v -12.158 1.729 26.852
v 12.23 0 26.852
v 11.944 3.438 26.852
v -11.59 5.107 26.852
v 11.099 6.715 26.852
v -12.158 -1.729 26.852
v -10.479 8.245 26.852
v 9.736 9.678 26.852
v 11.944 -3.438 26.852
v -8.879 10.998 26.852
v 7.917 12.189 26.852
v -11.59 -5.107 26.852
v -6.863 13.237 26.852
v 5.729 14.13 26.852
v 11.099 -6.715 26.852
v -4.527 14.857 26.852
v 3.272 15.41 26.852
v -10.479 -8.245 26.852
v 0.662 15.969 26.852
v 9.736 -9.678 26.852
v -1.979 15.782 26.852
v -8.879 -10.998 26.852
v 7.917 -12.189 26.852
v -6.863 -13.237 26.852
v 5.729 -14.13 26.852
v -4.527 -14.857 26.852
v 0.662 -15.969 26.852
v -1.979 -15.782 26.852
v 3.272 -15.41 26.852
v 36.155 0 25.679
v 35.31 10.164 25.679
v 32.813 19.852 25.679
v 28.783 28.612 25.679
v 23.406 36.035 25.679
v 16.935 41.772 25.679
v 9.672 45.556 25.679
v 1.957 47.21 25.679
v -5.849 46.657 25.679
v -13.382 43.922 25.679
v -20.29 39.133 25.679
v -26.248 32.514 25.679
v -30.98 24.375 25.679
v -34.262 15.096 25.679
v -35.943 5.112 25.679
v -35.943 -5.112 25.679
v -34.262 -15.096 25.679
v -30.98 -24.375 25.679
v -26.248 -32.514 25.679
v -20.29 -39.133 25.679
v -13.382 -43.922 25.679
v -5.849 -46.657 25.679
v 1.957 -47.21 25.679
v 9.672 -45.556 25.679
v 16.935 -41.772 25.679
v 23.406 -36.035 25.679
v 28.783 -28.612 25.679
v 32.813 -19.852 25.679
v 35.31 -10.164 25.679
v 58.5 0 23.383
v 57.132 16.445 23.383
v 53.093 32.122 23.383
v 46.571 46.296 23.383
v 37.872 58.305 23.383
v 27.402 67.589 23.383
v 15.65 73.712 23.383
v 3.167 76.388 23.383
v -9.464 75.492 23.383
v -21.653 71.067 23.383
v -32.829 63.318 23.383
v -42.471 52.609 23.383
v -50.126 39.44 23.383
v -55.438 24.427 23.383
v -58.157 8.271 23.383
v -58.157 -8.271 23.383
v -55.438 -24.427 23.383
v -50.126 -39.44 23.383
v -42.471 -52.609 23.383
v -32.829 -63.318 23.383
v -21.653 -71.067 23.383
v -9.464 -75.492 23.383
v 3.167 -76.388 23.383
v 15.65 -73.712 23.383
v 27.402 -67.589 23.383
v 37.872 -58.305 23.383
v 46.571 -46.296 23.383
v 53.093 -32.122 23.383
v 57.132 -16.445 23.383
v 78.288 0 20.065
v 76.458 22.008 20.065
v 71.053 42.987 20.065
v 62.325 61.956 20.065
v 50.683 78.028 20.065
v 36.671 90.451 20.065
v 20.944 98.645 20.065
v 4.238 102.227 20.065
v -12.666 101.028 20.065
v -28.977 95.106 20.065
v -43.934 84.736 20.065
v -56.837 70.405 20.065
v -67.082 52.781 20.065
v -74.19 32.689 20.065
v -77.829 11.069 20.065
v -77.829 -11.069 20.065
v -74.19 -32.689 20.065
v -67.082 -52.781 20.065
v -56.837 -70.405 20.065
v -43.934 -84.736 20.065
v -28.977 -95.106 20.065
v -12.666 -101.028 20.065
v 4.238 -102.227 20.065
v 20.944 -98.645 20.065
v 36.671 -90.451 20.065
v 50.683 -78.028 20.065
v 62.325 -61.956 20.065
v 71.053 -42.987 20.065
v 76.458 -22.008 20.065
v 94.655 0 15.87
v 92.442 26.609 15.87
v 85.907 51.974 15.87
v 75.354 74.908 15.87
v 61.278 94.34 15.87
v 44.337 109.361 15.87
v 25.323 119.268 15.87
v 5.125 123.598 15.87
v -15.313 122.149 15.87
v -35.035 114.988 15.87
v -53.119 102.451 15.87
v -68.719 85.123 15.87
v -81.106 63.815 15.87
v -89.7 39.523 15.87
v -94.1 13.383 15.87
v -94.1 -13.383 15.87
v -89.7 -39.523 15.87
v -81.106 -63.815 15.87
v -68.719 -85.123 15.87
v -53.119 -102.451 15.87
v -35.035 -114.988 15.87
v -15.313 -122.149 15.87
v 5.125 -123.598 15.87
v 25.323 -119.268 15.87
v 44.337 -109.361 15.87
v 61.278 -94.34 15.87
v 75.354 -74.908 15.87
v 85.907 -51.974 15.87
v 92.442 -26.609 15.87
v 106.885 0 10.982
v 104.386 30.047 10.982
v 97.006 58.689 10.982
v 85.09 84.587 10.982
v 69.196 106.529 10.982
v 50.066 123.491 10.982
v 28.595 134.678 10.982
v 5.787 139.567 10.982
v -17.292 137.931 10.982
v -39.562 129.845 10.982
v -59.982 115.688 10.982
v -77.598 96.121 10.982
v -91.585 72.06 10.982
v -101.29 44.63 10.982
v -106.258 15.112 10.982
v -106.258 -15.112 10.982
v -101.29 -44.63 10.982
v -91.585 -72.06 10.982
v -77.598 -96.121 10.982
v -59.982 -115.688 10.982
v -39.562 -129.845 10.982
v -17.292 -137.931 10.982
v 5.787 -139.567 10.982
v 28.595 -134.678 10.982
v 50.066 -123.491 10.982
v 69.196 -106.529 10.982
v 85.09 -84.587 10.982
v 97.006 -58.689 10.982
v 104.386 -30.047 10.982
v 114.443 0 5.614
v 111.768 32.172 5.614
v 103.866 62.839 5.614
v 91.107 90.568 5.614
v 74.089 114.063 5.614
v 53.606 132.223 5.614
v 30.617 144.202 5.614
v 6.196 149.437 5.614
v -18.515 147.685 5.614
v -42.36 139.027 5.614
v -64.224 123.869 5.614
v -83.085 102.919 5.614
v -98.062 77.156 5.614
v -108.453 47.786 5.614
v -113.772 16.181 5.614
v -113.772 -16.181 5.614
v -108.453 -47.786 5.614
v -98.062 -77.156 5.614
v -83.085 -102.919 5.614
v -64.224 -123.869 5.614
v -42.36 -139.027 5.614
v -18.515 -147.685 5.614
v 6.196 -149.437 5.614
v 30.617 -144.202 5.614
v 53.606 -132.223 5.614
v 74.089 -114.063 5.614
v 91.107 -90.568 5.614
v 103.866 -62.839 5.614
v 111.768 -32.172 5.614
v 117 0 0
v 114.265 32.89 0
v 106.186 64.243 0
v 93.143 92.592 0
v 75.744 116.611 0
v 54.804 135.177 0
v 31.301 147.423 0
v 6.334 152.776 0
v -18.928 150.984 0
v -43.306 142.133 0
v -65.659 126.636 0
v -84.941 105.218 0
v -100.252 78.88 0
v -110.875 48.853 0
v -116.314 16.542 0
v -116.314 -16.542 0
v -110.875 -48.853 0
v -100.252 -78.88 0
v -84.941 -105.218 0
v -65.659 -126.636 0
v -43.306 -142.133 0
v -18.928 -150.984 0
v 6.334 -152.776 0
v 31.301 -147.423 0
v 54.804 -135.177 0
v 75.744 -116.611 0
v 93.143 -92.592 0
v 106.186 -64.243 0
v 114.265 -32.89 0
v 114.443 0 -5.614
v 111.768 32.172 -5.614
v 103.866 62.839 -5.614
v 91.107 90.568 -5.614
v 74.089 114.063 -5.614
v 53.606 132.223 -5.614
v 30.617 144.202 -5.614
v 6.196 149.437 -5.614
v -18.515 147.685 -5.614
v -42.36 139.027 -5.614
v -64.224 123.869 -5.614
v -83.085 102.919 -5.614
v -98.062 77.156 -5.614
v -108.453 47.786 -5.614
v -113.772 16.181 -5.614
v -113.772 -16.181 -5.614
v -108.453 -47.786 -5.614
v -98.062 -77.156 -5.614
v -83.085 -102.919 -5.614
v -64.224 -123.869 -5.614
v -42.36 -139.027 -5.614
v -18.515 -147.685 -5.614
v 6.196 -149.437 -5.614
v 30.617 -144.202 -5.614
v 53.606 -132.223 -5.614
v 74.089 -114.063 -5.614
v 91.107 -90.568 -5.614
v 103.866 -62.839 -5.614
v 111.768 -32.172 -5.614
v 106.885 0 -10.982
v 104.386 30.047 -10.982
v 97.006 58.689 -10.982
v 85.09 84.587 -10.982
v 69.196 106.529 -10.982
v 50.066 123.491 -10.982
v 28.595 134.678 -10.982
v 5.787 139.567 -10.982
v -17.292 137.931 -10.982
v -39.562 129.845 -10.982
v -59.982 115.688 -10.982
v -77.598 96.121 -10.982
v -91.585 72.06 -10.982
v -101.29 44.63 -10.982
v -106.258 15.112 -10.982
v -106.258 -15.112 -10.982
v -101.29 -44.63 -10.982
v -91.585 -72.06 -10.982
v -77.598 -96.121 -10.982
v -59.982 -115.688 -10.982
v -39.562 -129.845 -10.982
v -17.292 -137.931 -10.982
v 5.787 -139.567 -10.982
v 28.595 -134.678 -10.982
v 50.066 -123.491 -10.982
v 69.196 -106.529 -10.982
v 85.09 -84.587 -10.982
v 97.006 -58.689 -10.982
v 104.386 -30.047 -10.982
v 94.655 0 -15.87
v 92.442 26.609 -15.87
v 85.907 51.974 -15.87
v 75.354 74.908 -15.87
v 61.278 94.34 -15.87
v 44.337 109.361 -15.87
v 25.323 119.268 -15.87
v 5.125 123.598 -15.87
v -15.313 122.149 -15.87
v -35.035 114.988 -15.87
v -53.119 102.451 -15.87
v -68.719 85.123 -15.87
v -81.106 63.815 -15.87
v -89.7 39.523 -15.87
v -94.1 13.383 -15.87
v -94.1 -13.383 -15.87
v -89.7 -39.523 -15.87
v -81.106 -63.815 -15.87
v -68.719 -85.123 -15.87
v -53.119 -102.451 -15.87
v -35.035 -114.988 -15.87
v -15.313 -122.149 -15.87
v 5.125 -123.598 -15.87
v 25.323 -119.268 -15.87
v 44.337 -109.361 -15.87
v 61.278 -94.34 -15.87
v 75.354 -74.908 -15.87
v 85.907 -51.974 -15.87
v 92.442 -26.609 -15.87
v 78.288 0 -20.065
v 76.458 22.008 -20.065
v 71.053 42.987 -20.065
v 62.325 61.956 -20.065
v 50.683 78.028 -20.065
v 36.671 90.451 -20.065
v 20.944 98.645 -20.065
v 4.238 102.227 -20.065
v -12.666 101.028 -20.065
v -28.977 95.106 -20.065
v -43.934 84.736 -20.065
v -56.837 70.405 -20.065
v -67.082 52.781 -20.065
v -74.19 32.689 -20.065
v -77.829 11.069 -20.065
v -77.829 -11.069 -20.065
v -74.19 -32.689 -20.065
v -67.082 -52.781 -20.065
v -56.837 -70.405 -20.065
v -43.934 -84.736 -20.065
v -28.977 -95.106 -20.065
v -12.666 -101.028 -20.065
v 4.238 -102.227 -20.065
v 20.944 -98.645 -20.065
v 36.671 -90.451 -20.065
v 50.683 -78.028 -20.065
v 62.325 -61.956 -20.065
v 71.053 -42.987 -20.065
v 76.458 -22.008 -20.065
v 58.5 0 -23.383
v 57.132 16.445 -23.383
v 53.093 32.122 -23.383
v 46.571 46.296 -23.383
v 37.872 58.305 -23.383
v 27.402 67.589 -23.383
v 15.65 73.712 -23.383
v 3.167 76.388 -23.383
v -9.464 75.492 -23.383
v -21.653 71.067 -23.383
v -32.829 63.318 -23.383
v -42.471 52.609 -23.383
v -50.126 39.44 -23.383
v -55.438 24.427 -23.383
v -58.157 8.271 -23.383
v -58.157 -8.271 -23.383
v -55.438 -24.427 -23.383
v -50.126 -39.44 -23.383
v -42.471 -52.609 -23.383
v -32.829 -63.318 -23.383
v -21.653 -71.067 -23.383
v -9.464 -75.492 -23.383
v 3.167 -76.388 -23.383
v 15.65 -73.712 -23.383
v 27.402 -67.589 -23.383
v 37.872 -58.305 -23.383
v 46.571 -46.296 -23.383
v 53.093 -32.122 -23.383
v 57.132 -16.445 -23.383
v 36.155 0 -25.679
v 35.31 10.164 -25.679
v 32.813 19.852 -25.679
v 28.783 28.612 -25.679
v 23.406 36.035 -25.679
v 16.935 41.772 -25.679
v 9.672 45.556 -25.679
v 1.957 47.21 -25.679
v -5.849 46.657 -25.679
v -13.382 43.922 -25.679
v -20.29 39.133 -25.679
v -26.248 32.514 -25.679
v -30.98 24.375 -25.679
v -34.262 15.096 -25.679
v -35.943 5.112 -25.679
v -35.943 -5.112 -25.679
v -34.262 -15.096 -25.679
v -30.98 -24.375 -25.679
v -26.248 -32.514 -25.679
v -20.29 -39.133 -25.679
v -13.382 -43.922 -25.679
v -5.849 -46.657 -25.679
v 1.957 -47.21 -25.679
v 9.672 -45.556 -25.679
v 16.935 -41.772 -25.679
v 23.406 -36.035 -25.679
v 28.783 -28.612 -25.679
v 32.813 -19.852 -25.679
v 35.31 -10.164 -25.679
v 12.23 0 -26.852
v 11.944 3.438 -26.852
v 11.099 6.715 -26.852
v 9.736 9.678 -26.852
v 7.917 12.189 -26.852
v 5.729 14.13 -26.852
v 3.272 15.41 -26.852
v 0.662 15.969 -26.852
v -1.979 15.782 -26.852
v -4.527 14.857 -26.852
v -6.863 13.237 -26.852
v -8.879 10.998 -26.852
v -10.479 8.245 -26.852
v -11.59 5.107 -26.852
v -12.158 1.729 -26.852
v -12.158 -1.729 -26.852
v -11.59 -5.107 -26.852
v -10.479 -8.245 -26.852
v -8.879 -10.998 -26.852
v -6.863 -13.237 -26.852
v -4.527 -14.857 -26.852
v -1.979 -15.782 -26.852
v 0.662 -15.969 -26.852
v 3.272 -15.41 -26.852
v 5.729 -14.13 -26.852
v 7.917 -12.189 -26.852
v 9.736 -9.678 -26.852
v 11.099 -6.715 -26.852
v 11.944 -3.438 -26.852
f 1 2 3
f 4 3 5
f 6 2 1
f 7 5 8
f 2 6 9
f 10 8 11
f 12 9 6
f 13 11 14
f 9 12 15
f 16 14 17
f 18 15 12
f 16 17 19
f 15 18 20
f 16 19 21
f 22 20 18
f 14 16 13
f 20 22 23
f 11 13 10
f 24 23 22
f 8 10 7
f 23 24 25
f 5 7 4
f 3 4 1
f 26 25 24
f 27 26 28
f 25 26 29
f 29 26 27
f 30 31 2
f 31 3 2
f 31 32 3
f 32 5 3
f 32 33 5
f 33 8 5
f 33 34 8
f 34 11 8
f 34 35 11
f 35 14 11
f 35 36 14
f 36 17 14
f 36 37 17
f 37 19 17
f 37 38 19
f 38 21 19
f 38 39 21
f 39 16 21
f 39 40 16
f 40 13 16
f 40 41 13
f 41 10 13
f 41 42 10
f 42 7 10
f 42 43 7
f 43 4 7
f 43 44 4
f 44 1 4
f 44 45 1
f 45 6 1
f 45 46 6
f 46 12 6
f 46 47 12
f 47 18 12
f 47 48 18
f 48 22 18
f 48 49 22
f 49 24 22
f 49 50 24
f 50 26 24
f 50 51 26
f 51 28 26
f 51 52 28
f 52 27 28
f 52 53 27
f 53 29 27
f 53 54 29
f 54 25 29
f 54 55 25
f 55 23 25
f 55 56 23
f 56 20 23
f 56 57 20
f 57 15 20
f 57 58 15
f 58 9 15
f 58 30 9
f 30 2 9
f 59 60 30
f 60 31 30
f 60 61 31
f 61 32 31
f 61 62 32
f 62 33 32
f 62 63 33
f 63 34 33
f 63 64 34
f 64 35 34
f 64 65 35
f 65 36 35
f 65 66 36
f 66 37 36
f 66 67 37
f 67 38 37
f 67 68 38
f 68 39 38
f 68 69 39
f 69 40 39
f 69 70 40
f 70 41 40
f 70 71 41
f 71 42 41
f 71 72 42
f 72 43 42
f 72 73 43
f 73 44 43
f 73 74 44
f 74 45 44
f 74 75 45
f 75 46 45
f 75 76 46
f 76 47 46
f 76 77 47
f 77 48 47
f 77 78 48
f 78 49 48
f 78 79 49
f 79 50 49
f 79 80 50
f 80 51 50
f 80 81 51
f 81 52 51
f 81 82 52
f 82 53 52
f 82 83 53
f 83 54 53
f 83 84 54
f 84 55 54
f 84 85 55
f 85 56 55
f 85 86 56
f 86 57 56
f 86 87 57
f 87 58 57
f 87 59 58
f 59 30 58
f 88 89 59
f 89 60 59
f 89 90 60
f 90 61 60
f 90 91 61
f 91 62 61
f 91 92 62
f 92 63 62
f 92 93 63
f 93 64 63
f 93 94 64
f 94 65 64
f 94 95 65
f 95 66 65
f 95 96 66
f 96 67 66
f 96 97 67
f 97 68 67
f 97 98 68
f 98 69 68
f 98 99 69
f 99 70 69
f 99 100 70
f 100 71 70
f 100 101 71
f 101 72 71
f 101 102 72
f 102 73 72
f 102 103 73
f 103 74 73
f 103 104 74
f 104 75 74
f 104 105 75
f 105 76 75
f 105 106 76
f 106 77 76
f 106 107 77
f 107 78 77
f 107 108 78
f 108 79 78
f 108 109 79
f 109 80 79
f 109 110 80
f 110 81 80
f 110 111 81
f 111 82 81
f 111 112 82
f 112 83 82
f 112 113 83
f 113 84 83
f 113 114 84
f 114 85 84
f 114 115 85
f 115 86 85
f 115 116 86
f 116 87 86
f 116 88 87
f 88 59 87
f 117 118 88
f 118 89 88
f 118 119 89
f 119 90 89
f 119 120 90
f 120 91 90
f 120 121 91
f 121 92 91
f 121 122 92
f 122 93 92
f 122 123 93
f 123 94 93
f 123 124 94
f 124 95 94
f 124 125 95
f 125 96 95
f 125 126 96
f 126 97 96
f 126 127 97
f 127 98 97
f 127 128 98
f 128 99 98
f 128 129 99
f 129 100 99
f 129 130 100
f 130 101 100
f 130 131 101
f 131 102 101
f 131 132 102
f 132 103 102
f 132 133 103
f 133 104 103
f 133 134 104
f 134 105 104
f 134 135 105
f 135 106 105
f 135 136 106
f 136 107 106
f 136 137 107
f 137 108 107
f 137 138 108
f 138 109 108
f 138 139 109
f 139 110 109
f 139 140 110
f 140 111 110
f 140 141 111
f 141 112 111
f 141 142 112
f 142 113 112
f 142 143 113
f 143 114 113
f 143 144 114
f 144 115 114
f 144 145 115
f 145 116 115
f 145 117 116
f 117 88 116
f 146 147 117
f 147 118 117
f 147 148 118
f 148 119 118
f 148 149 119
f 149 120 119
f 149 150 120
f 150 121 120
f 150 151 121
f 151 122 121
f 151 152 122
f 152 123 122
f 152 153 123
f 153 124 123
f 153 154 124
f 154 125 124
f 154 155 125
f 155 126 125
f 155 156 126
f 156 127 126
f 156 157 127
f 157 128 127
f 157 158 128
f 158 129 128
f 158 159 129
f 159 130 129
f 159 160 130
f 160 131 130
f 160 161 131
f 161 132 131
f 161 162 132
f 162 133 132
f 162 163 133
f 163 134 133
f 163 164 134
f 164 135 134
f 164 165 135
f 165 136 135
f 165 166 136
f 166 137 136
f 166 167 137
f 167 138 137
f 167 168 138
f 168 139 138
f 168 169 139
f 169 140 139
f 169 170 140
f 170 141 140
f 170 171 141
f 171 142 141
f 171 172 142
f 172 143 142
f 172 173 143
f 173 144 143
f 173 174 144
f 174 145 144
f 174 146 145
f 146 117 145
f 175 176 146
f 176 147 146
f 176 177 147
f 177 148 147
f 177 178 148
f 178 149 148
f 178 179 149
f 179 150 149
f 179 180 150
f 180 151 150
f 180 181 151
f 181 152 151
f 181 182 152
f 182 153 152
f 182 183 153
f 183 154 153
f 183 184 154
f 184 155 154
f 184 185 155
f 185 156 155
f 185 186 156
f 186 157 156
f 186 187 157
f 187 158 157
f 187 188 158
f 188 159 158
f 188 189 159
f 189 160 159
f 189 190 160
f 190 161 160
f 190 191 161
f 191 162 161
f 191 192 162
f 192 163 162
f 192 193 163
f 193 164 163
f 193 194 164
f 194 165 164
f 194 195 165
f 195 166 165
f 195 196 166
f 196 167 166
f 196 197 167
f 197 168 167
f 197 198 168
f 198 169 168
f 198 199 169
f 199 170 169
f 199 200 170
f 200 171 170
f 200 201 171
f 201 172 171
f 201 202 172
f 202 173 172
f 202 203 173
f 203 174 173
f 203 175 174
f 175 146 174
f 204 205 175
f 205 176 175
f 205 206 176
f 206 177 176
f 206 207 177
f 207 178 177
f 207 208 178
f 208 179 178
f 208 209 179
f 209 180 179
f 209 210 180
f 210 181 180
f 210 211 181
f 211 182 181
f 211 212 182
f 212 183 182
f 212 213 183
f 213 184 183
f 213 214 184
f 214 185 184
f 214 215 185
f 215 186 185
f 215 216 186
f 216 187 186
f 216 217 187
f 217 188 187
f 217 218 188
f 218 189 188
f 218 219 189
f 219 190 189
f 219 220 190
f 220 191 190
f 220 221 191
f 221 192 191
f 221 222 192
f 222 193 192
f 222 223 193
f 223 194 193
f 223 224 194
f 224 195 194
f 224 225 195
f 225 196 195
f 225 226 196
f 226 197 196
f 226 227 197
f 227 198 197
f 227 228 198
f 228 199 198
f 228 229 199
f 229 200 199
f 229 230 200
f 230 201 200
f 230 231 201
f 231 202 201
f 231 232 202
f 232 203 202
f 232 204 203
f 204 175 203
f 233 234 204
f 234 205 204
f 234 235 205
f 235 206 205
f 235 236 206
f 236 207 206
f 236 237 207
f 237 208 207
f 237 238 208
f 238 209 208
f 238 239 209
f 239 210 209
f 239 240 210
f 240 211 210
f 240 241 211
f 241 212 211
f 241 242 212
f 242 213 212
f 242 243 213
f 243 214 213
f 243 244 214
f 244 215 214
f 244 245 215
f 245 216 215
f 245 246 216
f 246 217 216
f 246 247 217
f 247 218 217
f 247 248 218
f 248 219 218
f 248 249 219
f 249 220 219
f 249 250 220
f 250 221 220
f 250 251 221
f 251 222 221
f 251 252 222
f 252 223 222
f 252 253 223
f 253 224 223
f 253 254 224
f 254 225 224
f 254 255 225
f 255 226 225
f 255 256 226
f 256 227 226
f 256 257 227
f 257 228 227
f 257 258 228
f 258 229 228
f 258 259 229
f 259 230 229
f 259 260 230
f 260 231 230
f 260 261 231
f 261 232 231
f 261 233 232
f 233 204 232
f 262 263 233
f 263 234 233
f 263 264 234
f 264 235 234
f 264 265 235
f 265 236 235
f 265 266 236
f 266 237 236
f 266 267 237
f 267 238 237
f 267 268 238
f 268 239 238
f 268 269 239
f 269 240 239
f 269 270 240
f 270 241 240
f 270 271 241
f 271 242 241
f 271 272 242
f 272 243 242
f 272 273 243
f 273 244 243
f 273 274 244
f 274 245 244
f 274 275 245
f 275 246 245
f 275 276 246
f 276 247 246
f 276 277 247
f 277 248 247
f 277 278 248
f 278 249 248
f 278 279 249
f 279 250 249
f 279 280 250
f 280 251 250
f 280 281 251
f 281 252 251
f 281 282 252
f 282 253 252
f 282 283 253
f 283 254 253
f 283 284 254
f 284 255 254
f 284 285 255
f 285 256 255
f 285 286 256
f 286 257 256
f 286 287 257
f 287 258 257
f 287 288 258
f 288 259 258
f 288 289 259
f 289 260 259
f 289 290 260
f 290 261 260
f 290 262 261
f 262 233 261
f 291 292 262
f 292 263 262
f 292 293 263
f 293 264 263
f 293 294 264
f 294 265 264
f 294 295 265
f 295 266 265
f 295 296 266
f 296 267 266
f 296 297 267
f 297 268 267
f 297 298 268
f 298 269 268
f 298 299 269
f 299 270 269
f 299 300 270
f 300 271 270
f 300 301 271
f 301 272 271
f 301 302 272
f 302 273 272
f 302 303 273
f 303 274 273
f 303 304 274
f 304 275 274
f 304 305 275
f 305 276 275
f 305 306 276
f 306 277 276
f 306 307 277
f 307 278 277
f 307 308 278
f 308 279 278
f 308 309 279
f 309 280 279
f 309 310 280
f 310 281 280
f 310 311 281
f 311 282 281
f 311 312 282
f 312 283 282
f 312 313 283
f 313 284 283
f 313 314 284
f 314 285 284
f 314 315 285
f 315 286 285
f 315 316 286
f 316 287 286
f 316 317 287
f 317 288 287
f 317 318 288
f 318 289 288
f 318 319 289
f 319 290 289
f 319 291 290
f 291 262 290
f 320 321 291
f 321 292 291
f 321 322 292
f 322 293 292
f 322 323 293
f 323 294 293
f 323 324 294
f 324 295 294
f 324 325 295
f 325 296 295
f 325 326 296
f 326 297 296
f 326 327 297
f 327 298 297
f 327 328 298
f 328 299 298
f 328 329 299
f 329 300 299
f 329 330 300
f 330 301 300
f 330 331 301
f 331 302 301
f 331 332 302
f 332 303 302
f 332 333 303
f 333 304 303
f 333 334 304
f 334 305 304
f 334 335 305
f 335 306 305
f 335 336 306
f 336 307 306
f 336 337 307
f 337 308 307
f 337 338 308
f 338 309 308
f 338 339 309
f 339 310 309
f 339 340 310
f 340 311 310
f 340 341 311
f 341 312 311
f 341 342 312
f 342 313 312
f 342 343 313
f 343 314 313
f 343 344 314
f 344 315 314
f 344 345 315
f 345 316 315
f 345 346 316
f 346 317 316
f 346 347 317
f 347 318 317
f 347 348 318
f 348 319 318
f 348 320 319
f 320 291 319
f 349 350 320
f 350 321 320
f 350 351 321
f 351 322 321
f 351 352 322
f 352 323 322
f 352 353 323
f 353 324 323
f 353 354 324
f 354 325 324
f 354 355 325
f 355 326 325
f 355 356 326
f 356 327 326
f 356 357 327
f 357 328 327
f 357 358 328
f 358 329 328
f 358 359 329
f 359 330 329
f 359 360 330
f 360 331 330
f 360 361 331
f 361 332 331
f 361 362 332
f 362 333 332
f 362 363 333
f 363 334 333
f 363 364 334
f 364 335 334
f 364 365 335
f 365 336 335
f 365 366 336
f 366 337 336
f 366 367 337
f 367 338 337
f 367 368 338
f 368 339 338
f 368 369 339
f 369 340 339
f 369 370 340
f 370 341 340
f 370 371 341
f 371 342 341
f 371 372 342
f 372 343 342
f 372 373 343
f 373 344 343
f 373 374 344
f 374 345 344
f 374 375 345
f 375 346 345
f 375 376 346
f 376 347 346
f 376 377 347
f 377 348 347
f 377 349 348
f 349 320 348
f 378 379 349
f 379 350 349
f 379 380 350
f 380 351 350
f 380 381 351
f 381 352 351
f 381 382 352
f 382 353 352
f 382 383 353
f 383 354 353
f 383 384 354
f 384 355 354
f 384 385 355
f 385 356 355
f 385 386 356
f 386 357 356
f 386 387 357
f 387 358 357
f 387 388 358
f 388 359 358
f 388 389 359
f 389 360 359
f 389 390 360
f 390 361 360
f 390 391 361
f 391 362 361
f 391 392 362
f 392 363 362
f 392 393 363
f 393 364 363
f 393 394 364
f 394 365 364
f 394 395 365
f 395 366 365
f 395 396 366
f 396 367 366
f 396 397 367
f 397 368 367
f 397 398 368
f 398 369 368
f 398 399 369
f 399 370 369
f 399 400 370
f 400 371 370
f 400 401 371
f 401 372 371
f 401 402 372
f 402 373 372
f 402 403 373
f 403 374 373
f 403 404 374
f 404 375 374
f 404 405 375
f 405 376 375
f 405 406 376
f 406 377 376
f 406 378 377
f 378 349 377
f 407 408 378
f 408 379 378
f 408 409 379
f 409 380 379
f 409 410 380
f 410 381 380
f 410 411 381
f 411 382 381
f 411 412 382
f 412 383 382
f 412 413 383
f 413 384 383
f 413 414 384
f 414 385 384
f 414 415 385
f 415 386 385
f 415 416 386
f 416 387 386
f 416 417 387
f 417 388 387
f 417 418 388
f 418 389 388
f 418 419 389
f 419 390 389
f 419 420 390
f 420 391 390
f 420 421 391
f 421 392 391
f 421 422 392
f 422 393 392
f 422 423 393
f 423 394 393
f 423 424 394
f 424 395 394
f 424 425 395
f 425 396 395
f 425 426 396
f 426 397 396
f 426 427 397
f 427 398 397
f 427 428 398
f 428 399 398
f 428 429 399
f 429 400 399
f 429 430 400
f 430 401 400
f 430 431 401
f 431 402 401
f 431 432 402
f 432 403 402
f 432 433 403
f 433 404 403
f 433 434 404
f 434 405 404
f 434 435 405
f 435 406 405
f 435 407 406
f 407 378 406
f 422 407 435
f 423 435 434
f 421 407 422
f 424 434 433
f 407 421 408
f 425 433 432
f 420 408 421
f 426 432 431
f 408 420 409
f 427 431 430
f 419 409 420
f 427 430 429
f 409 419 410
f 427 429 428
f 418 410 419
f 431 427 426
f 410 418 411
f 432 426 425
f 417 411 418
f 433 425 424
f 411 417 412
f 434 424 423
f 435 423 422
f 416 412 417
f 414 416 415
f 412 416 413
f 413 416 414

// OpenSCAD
// Generated by SolidPython 1.0.1 on 2020-07-29 00:46:51


scale(v = [13, 17, 3]) {
	sphere(r = 9);
}
/***********************************************
*********      SolidPython code:      **********
************************************************
 
# import packages: SolidPython
from solid import *
from solid.utils import *
from itertools import chain, combinations, permutations


class Resize:

    def __init__(self, scad_file):
        self.scad_file = scad_file
        #self.scad_file = import_scad(scad_file)
        # cone/cylinder param:
        self.r1 = 0
        self.r2 = 0
        self.h = 0
        # rectangular prism param:
        self.w = 0
        self.l = 0
        # ellipse param:
        self.r = 0

    # import OpenScad code (file name corresponds to shape)


    # classify shape + parameters
    def assign(self, param1, param2, param3):
        if self.scad_file == 'cone.scad':
            self.r1 = param1
            self.r2 = param2
            self.h = param3
        elif self.scad_file == 'cylinder.scad':
            self.r1 = param1
            self.r2 = param2
            self.h = param3
        elif self.scad_file == 'rectangularPrism.scad':
            self.h = param1
            self.l = param2
            self.w = param3
        else:
            self.r = param1
            self.h = param2

    # resize parameters
    def iterate(self):
        x = range(3, 20, 2)
        i = 1
        if self.scad_file == 'cone.scad':
            tempList = list(permutations(x, 2))
            for temp in tempList:
                param1 = temp[0]
                param2 = temp[1]
                filepath = 'produced_scad_files/' + 'cone' + str(param1) + '_' + str(param2) + '_' + '.scad'
                scad_render_to_file(cylinder(h=param1, r1=param2, r2=0), filepath)

        elif self.scad_file == 'cylinder.scad':
            tempList = list(permutations(x, 3))
            for temp in tempList:
                param1 = temp[0]
                param2 = temp[1]
                filepath = 'produced_scad_files/' + 'cylinder' + str(param1) + '_' + str(param2) + '_' + '.scad'
                scad_render_to_file(cylinder(h=param1, r1=param2, r2=param2), filepath)

        elif self.scad_file == 'rectangularPrism.scad':
            tempList = list(permutations(x, 3))
            for temp in tempList:
                param1 = temp[0]
                param2 = temp[1]
                param3 = temp[2]
                filepath = 'produced_scad_files/' + 'rectangularPrism' + str(param1) + '_' + str(param2) + '_' + str(
                    param3) + '.scad'
                scad_render_to_file(cube(size=(param1, param2, param3)), filepath)

        elif self.scad_file == 'ellipse.scad':
            tempList = list(permutations(x, 4))
            for temp in tempList:
                param1 = temp[0]
                param2 = temp[1]
                param3 = temp[2]
                param4 = temp[3]
                filepath = 'produced_scad_files/' + 'ellipse' + str(param1) + '_' + str(param2) + '_' + str(param3) + '_' + str(param4) + '.scad'
                scad_render_to_file(scale([param1, param2, param3])(sphere(r=param4)), filepath)

    def render_to_scadfile(self):
        scad_render_to_file(scad, 'example.scad') 
 
************************************************/
